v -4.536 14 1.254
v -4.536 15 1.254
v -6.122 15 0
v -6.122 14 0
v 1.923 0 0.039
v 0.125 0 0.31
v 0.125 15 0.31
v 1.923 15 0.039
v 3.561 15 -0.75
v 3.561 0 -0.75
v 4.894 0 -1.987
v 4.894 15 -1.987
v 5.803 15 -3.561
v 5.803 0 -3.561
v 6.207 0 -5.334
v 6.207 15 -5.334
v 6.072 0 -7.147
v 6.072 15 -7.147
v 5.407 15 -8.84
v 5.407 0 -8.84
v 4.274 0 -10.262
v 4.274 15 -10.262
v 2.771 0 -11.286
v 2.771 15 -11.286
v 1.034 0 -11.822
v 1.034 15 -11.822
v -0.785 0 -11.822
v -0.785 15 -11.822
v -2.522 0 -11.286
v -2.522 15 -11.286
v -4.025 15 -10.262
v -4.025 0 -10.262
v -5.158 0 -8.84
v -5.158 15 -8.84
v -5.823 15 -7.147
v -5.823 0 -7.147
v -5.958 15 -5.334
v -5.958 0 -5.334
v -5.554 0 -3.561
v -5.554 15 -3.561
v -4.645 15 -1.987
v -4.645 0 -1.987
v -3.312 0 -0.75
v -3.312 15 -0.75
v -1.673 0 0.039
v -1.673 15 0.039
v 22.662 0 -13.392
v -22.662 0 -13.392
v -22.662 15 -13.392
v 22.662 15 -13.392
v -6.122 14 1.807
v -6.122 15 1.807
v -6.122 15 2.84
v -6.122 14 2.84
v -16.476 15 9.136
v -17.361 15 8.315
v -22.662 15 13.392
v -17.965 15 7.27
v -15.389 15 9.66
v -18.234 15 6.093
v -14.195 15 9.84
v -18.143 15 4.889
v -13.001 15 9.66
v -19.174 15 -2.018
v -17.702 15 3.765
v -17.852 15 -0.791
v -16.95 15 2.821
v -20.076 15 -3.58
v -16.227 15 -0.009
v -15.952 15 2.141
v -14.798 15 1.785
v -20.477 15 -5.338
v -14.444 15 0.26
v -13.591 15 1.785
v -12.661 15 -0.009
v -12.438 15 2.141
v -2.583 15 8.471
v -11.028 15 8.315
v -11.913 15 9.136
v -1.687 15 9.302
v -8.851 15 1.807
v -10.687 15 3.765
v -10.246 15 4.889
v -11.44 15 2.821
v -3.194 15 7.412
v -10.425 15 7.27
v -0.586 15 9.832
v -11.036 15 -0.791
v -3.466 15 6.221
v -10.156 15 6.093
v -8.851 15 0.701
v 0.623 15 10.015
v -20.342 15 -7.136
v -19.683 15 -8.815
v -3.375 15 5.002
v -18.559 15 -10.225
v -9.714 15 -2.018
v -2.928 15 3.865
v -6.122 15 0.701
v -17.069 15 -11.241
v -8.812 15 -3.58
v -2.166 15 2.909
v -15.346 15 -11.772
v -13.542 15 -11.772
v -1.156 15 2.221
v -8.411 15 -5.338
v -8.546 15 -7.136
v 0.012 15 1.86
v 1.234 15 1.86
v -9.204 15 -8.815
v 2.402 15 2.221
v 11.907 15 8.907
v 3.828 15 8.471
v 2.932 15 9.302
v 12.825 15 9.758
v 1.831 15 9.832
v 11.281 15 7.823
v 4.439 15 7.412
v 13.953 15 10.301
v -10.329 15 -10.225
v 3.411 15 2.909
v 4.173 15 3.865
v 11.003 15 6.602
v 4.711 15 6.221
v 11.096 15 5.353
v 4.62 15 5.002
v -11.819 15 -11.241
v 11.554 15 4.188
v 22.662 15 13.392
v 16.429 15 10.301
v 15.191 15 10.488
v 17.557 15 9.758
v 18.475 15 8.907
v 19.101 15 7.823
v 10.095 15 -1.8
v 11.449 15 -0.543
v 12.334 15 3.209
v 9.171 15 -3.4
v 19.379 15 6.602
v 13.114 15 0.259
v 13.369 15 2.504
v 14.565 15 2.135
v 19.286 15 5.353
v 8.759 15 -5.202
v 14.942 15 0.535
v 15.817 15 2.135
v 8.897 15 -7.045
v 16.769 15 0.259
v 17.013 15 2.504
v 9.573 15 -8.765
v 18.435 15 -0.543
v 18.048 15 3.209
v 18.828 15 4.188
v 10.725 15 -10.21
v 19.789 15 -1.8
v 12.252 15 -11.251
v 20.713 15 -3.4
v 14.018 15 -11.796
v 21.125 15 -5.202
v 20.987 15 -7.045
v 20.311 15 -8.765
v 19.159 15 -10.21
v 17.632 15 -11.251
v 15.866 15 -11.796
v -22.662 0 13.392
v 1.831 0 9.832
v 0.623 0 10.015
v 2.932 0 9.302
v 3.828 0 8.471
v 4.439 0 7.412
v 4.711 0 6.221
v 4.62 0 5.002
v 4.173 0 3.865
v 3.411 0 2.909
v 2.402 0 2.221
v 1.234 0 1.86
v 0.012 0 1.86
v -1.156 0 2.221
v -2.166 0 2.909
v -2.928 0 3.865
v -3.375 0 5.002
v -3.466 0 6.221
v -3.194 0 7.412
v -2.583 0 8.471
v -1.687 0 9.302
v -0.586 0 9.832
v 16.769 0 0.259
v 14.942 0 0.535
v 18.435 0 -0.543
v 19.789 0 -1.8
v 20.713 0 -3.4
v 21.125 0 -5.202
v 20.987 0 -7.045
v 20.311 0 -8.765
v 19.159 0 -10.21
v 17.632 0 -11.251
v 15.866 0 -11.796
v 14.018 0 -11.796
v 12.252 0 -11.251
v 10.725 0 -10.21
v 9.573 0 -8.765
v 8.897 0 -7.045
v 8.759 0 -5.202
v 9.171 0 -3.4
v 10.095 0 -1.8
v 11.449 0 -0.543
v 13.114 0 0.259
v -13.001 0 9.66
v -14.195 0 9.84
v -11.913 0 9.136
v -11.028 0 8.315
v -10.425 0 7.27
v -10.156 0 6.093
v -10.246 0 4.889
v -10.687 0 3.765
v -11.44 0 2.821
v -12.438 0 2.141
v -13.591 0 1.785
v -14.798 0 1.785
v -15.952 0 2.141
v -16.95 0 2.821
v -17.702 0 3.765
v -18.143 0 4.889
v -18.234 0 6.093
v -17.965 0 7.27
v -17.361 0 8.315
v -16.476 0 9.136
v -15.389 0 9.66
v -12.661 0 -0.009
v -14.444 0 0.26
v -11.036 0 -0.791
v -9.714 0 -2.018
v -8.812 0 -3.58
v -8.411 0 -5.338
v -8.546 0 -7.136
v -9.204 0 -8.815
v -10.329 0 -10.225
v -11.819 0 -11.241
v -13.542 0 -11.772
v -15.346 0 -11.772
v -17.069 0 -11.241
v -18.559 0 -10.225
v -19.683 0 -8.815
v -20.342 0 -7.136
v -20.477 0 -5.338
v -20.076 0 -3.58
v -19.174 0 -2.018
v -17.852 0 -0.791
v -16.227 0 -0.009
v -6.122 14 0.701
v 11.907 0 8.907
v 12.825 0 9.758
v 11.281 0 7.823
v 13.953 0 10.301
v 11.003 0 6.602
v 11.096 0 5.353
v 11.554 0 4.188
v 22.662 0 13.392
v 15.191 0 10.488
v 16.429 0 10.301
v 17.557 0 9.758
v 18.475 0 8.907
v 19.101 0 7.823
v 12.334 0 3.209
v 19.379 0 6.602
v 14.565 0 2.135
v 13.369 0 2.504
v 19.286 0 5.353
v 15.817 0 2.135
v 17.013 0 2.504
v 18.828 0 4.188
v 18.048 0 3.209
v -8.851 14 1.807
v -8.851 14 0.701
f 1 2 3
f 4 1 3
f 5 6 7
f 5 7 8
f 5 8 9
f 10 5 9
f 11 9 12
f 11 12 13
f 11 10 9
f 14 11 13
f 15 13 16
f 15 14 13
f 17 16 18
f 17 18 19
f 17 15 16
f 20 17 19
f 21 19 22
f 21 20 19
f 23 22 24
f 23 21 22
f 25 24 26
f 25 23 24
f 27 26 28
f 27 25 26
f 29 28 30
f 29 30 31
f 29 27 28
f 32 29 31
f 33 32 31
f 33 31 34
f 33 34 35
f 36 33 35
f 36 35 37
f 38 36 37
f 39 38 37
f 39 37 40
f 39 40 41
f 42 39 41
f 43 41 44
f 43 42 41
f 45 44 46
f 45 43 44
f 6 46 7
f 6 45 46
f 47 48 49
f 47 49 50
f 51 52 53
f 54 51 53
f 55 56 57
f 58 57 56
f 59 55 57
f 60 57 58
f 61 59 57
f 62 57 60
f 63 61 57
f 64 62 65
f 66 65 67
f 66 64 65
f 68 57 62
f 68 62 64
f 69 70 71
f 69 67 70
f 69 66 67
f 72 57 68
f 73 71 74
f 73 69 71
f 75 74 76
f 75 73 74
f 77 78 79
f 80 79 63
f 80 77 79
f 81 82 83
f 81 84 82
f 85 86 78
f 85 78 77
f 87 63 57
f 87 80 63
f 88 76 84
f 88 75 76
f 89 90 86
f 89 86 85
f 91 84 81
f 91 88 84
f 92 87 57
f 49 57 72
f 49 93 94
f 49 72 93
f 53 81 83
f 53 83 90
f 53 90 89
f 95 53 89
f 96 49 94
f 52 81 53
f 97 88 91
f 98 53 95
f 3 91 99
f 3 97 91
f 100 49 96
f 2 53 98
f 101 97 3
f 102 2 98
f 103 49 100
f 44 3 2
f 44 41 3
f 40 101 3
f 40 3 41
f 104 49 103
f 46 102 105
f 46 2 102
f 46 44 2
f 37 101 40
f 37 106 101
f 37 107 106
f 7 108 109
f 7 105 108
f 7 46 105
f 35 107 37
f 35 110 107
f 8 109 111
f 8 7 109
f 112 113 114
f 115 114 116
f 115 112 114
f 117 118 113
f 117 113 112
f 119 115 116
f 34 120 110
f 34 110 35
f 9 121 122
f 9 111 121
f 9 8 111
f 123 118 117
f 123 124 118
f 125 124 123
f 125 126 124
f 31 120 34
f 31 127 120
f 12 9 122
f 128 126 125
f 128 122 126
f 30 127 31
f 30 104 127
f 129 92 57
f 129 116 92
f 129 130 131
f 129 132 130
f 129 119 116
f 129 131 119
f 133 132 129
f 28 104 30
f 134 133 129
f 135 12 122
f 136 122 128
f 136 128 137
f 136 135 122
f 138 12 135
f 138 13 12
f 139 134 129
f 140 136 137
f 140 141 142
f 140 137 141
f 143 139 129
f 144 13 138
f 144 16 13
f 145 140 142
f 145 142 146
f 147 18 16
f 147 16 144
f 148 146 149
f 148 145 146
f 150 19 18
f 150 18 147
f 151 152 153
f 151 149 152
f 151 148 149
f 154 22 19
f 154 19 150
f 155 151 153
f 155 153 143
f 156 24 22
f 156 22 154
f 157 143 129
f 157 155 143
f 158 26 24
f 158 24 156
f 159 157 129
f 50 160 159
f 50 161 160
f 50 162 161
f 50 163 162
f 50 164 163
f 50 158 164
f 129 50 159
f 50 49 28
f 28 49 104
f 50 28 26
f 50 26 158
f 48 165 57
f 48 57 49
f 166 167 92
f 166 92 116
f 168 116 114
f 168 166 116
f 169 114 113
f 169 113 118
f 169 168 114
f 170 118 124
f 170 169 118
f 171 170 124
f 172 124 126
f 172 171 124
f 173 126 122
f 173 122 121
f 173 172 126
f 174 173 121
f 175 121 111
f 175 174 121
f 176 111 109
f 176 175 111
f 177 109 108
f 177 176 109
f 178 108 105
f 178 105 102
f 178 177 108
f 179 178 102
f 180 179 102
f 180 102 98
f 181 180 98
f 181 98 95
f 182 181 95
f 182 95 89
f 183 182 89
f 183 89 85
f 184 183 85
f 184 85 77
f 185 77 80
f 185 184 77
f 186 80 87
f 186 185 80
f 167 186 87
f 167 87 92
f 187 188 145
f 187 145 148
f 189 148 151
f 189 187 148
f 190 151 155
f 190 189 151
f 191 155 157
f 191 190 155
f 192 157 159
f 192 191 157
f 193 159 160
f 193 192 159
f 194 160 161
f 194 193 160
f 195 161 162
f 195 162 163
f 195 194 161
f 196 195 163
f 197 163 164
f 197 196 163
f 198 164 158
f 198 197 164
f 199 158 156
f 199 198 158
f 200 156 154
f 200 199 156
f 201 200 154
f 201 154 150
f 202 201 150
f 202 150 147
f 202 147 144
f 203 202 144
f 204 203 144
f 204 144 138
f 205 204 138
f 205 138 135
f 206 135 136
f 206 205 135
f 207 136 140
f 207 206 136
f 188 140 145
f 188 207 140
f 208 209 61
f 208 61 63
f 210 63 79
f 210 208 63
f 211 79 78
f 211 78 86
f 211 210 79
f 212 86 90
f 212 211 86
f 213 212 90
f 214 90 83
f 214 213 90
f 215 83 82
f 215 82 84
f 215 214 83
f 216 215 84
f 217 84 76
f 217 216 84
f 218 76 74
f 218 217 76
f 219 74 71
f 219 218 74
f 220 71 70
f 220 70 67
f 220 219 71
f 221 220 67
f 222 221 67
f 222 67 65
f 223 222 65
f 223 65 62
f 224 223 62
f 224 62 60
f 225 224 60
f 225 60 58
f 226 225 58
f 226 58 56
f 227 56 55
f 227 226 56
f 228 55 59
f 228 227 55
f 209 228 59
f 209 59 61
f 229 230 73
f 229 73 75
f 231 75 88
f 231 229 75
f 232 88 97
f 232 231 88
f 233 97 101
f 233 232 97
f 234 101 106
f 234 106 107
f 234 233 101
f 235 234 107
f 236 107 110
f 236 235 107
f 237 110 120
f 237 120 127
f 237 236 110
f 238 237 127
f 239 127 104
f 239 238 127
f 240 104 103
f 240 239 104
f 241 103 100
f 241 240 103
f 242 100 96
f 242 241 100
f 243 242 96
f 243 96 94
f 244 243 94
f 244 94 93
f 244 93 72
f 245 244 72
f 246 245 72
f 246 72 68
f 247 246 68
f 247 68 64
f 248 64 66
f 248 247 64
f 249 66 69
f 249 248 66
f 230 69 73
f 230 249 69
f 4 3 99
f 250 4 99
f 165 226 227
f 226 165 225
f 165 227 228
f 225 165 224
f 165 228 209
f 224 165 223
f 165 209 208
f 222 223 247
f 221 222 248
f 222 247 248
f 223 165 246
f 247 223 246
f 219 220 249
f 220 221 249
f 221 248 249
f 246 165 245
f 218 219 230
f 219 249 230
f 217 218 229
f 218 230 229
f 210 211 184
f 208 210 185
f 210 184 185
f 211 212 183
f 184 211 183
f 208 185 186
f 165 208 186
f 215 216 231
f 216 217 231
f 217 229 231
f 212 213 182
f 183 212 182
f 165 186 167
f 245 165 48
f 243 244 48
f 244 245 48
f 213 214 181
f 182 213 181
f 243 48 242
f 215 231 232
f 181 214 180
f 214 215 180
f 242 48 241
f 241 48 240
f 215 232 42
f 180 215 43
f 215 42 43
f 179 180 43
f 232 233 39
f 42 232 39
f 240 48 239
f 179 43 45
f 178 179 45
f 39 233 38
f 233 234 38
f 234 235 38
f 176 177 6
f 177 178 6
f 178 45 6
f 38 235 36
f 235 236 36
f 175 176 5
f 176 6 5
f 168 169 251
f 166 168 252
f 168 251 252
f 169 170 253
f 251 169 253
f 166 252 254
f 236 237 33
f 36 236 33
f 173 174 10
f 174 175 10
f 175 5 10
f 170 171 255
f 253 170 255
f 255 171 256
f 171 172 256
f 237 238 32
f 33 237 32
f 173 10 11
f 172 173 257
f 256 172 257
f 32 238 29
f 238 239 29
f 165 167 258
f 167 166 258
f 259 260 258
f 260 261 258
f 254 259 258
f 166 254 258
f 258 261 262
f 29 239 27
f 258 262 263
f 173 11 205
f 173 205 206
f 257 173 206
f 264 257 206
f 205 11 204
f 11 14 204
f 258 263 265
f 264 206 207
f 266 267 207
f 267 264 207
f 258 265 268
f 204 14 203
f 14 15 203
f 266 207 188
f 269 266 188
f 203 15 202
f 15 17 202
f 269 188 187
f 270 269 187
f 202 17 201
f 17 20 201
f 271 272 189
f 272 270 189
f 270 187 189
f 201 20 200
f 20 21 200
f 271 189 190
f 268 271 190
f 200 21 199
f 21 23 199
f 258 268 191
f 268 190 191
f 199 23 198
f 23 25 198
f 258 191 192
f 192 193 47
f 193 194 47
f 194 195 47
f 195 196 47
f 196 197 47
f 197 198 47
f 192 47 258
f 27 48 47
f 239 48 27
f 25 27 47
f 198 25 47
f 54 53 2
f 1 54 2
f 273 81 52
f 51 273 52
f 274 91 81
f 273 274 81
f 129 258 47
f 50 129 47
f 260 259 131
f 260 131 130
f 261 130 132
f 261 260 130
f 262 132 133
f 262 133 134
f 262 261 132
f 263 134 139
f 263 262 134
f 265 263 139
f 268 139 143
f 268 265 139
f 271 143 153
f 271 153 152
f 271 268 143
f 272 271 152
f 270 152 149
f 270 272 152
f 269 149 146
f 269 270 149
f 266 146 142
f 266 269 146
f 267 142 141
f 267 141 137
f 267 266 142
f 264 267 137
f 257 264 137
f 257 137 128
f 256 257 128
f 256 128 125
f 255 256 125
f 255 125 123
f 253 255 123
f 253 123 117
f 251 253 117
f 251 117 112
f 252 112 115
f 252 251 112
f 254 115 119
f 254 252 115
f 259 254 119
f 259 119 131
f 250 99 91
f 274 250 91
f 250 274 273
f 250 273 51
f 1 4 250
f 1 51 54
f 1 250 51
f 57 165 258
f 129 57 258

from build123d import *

# Parameters (mm, degrees)
SKETCH1_W           = 45.323908176
SKETCH1_H           = 26.783449256
SKETCH1_R           = 4.05
SKETCH1_R_2         = 4.1
SKETCH1_R_3         = 4.2
SKETCH1_R_4         = 6.05
SKETCH1_R_5         = 6.1
SKETCH1_R_6         = 6.2
BOSS_EXTRUDE1_DEPTH = 15
CUT_EXTRUDE1_DEPTH  = 1


with BuildPart() as part:
    # Sketch1 → Boss-Extrude1 (new body)
    with BuildSketch(Plane(origin=(0, 0, 0), x_dir=(1, 0, 0), z_dir=(0, 1, 0))):
        Rectangle(SKETCH1_W, SKETCH1_H)
        with Locations(Location((-14.194850363, -5.790004753, 0), (0, 0, 270))):
            Circle(SKETCH1_R, mode=Mode.SUBTRACT)
        with Locations(Location((0.622581156, -5.914520985, 0), (0, 0, 270))):
            Circle(SKETCH1_R_2, mode=Mode.SUBTRACT)
        with Locations(Location((15.190980213, -6.288069678, 0), (0, 0, 270))):
            Circle(SKETCH1_R_3, mode=Mode.SUBTRACT)
        with Locations(Location((-14.443882825, 5.790004753, 0), (0, 0, 270))):
            Circle(SKETCH1_R_4, mode=Mode.SUBTRACT)
        with Locations(Location((0.124516231, 5.790004753, 0), (0, 0, 270))):
            Circle(SKETCH1_R_5, mode=Mode.SUBTRACT)
        with Locations(Location((14.94194775, 5.665488522, 0), (0, 0, 270))):
            Circle(SKETCH1_R_6, mode=Mode.SUBTRACT)
    extrude(amount=BOSS_EXTRUDE1_DEPTH)

    # Sketch2 → Cut-Extrude1 (cut)
    with BuildSketch(Plane(origin=(0, 15, 0), x_dir=(1, 0, 0), z_dir=(0, 1, 0))):
        Polygon((-6.12211696, 0), (-6.12211696, -0.70072423), (-8.851253436, -0.70072423), (-8.851253436, -1.80713091), (-6.12211696, -1.80713091), (-6.12211696, -2.839777144), (-4.536267386, -1.25392757), align=None)
    extrude(amount=-CUT_EXTRUDE1_DEPTH, mode=Mode.SUBTRACT)


solid = part.part
